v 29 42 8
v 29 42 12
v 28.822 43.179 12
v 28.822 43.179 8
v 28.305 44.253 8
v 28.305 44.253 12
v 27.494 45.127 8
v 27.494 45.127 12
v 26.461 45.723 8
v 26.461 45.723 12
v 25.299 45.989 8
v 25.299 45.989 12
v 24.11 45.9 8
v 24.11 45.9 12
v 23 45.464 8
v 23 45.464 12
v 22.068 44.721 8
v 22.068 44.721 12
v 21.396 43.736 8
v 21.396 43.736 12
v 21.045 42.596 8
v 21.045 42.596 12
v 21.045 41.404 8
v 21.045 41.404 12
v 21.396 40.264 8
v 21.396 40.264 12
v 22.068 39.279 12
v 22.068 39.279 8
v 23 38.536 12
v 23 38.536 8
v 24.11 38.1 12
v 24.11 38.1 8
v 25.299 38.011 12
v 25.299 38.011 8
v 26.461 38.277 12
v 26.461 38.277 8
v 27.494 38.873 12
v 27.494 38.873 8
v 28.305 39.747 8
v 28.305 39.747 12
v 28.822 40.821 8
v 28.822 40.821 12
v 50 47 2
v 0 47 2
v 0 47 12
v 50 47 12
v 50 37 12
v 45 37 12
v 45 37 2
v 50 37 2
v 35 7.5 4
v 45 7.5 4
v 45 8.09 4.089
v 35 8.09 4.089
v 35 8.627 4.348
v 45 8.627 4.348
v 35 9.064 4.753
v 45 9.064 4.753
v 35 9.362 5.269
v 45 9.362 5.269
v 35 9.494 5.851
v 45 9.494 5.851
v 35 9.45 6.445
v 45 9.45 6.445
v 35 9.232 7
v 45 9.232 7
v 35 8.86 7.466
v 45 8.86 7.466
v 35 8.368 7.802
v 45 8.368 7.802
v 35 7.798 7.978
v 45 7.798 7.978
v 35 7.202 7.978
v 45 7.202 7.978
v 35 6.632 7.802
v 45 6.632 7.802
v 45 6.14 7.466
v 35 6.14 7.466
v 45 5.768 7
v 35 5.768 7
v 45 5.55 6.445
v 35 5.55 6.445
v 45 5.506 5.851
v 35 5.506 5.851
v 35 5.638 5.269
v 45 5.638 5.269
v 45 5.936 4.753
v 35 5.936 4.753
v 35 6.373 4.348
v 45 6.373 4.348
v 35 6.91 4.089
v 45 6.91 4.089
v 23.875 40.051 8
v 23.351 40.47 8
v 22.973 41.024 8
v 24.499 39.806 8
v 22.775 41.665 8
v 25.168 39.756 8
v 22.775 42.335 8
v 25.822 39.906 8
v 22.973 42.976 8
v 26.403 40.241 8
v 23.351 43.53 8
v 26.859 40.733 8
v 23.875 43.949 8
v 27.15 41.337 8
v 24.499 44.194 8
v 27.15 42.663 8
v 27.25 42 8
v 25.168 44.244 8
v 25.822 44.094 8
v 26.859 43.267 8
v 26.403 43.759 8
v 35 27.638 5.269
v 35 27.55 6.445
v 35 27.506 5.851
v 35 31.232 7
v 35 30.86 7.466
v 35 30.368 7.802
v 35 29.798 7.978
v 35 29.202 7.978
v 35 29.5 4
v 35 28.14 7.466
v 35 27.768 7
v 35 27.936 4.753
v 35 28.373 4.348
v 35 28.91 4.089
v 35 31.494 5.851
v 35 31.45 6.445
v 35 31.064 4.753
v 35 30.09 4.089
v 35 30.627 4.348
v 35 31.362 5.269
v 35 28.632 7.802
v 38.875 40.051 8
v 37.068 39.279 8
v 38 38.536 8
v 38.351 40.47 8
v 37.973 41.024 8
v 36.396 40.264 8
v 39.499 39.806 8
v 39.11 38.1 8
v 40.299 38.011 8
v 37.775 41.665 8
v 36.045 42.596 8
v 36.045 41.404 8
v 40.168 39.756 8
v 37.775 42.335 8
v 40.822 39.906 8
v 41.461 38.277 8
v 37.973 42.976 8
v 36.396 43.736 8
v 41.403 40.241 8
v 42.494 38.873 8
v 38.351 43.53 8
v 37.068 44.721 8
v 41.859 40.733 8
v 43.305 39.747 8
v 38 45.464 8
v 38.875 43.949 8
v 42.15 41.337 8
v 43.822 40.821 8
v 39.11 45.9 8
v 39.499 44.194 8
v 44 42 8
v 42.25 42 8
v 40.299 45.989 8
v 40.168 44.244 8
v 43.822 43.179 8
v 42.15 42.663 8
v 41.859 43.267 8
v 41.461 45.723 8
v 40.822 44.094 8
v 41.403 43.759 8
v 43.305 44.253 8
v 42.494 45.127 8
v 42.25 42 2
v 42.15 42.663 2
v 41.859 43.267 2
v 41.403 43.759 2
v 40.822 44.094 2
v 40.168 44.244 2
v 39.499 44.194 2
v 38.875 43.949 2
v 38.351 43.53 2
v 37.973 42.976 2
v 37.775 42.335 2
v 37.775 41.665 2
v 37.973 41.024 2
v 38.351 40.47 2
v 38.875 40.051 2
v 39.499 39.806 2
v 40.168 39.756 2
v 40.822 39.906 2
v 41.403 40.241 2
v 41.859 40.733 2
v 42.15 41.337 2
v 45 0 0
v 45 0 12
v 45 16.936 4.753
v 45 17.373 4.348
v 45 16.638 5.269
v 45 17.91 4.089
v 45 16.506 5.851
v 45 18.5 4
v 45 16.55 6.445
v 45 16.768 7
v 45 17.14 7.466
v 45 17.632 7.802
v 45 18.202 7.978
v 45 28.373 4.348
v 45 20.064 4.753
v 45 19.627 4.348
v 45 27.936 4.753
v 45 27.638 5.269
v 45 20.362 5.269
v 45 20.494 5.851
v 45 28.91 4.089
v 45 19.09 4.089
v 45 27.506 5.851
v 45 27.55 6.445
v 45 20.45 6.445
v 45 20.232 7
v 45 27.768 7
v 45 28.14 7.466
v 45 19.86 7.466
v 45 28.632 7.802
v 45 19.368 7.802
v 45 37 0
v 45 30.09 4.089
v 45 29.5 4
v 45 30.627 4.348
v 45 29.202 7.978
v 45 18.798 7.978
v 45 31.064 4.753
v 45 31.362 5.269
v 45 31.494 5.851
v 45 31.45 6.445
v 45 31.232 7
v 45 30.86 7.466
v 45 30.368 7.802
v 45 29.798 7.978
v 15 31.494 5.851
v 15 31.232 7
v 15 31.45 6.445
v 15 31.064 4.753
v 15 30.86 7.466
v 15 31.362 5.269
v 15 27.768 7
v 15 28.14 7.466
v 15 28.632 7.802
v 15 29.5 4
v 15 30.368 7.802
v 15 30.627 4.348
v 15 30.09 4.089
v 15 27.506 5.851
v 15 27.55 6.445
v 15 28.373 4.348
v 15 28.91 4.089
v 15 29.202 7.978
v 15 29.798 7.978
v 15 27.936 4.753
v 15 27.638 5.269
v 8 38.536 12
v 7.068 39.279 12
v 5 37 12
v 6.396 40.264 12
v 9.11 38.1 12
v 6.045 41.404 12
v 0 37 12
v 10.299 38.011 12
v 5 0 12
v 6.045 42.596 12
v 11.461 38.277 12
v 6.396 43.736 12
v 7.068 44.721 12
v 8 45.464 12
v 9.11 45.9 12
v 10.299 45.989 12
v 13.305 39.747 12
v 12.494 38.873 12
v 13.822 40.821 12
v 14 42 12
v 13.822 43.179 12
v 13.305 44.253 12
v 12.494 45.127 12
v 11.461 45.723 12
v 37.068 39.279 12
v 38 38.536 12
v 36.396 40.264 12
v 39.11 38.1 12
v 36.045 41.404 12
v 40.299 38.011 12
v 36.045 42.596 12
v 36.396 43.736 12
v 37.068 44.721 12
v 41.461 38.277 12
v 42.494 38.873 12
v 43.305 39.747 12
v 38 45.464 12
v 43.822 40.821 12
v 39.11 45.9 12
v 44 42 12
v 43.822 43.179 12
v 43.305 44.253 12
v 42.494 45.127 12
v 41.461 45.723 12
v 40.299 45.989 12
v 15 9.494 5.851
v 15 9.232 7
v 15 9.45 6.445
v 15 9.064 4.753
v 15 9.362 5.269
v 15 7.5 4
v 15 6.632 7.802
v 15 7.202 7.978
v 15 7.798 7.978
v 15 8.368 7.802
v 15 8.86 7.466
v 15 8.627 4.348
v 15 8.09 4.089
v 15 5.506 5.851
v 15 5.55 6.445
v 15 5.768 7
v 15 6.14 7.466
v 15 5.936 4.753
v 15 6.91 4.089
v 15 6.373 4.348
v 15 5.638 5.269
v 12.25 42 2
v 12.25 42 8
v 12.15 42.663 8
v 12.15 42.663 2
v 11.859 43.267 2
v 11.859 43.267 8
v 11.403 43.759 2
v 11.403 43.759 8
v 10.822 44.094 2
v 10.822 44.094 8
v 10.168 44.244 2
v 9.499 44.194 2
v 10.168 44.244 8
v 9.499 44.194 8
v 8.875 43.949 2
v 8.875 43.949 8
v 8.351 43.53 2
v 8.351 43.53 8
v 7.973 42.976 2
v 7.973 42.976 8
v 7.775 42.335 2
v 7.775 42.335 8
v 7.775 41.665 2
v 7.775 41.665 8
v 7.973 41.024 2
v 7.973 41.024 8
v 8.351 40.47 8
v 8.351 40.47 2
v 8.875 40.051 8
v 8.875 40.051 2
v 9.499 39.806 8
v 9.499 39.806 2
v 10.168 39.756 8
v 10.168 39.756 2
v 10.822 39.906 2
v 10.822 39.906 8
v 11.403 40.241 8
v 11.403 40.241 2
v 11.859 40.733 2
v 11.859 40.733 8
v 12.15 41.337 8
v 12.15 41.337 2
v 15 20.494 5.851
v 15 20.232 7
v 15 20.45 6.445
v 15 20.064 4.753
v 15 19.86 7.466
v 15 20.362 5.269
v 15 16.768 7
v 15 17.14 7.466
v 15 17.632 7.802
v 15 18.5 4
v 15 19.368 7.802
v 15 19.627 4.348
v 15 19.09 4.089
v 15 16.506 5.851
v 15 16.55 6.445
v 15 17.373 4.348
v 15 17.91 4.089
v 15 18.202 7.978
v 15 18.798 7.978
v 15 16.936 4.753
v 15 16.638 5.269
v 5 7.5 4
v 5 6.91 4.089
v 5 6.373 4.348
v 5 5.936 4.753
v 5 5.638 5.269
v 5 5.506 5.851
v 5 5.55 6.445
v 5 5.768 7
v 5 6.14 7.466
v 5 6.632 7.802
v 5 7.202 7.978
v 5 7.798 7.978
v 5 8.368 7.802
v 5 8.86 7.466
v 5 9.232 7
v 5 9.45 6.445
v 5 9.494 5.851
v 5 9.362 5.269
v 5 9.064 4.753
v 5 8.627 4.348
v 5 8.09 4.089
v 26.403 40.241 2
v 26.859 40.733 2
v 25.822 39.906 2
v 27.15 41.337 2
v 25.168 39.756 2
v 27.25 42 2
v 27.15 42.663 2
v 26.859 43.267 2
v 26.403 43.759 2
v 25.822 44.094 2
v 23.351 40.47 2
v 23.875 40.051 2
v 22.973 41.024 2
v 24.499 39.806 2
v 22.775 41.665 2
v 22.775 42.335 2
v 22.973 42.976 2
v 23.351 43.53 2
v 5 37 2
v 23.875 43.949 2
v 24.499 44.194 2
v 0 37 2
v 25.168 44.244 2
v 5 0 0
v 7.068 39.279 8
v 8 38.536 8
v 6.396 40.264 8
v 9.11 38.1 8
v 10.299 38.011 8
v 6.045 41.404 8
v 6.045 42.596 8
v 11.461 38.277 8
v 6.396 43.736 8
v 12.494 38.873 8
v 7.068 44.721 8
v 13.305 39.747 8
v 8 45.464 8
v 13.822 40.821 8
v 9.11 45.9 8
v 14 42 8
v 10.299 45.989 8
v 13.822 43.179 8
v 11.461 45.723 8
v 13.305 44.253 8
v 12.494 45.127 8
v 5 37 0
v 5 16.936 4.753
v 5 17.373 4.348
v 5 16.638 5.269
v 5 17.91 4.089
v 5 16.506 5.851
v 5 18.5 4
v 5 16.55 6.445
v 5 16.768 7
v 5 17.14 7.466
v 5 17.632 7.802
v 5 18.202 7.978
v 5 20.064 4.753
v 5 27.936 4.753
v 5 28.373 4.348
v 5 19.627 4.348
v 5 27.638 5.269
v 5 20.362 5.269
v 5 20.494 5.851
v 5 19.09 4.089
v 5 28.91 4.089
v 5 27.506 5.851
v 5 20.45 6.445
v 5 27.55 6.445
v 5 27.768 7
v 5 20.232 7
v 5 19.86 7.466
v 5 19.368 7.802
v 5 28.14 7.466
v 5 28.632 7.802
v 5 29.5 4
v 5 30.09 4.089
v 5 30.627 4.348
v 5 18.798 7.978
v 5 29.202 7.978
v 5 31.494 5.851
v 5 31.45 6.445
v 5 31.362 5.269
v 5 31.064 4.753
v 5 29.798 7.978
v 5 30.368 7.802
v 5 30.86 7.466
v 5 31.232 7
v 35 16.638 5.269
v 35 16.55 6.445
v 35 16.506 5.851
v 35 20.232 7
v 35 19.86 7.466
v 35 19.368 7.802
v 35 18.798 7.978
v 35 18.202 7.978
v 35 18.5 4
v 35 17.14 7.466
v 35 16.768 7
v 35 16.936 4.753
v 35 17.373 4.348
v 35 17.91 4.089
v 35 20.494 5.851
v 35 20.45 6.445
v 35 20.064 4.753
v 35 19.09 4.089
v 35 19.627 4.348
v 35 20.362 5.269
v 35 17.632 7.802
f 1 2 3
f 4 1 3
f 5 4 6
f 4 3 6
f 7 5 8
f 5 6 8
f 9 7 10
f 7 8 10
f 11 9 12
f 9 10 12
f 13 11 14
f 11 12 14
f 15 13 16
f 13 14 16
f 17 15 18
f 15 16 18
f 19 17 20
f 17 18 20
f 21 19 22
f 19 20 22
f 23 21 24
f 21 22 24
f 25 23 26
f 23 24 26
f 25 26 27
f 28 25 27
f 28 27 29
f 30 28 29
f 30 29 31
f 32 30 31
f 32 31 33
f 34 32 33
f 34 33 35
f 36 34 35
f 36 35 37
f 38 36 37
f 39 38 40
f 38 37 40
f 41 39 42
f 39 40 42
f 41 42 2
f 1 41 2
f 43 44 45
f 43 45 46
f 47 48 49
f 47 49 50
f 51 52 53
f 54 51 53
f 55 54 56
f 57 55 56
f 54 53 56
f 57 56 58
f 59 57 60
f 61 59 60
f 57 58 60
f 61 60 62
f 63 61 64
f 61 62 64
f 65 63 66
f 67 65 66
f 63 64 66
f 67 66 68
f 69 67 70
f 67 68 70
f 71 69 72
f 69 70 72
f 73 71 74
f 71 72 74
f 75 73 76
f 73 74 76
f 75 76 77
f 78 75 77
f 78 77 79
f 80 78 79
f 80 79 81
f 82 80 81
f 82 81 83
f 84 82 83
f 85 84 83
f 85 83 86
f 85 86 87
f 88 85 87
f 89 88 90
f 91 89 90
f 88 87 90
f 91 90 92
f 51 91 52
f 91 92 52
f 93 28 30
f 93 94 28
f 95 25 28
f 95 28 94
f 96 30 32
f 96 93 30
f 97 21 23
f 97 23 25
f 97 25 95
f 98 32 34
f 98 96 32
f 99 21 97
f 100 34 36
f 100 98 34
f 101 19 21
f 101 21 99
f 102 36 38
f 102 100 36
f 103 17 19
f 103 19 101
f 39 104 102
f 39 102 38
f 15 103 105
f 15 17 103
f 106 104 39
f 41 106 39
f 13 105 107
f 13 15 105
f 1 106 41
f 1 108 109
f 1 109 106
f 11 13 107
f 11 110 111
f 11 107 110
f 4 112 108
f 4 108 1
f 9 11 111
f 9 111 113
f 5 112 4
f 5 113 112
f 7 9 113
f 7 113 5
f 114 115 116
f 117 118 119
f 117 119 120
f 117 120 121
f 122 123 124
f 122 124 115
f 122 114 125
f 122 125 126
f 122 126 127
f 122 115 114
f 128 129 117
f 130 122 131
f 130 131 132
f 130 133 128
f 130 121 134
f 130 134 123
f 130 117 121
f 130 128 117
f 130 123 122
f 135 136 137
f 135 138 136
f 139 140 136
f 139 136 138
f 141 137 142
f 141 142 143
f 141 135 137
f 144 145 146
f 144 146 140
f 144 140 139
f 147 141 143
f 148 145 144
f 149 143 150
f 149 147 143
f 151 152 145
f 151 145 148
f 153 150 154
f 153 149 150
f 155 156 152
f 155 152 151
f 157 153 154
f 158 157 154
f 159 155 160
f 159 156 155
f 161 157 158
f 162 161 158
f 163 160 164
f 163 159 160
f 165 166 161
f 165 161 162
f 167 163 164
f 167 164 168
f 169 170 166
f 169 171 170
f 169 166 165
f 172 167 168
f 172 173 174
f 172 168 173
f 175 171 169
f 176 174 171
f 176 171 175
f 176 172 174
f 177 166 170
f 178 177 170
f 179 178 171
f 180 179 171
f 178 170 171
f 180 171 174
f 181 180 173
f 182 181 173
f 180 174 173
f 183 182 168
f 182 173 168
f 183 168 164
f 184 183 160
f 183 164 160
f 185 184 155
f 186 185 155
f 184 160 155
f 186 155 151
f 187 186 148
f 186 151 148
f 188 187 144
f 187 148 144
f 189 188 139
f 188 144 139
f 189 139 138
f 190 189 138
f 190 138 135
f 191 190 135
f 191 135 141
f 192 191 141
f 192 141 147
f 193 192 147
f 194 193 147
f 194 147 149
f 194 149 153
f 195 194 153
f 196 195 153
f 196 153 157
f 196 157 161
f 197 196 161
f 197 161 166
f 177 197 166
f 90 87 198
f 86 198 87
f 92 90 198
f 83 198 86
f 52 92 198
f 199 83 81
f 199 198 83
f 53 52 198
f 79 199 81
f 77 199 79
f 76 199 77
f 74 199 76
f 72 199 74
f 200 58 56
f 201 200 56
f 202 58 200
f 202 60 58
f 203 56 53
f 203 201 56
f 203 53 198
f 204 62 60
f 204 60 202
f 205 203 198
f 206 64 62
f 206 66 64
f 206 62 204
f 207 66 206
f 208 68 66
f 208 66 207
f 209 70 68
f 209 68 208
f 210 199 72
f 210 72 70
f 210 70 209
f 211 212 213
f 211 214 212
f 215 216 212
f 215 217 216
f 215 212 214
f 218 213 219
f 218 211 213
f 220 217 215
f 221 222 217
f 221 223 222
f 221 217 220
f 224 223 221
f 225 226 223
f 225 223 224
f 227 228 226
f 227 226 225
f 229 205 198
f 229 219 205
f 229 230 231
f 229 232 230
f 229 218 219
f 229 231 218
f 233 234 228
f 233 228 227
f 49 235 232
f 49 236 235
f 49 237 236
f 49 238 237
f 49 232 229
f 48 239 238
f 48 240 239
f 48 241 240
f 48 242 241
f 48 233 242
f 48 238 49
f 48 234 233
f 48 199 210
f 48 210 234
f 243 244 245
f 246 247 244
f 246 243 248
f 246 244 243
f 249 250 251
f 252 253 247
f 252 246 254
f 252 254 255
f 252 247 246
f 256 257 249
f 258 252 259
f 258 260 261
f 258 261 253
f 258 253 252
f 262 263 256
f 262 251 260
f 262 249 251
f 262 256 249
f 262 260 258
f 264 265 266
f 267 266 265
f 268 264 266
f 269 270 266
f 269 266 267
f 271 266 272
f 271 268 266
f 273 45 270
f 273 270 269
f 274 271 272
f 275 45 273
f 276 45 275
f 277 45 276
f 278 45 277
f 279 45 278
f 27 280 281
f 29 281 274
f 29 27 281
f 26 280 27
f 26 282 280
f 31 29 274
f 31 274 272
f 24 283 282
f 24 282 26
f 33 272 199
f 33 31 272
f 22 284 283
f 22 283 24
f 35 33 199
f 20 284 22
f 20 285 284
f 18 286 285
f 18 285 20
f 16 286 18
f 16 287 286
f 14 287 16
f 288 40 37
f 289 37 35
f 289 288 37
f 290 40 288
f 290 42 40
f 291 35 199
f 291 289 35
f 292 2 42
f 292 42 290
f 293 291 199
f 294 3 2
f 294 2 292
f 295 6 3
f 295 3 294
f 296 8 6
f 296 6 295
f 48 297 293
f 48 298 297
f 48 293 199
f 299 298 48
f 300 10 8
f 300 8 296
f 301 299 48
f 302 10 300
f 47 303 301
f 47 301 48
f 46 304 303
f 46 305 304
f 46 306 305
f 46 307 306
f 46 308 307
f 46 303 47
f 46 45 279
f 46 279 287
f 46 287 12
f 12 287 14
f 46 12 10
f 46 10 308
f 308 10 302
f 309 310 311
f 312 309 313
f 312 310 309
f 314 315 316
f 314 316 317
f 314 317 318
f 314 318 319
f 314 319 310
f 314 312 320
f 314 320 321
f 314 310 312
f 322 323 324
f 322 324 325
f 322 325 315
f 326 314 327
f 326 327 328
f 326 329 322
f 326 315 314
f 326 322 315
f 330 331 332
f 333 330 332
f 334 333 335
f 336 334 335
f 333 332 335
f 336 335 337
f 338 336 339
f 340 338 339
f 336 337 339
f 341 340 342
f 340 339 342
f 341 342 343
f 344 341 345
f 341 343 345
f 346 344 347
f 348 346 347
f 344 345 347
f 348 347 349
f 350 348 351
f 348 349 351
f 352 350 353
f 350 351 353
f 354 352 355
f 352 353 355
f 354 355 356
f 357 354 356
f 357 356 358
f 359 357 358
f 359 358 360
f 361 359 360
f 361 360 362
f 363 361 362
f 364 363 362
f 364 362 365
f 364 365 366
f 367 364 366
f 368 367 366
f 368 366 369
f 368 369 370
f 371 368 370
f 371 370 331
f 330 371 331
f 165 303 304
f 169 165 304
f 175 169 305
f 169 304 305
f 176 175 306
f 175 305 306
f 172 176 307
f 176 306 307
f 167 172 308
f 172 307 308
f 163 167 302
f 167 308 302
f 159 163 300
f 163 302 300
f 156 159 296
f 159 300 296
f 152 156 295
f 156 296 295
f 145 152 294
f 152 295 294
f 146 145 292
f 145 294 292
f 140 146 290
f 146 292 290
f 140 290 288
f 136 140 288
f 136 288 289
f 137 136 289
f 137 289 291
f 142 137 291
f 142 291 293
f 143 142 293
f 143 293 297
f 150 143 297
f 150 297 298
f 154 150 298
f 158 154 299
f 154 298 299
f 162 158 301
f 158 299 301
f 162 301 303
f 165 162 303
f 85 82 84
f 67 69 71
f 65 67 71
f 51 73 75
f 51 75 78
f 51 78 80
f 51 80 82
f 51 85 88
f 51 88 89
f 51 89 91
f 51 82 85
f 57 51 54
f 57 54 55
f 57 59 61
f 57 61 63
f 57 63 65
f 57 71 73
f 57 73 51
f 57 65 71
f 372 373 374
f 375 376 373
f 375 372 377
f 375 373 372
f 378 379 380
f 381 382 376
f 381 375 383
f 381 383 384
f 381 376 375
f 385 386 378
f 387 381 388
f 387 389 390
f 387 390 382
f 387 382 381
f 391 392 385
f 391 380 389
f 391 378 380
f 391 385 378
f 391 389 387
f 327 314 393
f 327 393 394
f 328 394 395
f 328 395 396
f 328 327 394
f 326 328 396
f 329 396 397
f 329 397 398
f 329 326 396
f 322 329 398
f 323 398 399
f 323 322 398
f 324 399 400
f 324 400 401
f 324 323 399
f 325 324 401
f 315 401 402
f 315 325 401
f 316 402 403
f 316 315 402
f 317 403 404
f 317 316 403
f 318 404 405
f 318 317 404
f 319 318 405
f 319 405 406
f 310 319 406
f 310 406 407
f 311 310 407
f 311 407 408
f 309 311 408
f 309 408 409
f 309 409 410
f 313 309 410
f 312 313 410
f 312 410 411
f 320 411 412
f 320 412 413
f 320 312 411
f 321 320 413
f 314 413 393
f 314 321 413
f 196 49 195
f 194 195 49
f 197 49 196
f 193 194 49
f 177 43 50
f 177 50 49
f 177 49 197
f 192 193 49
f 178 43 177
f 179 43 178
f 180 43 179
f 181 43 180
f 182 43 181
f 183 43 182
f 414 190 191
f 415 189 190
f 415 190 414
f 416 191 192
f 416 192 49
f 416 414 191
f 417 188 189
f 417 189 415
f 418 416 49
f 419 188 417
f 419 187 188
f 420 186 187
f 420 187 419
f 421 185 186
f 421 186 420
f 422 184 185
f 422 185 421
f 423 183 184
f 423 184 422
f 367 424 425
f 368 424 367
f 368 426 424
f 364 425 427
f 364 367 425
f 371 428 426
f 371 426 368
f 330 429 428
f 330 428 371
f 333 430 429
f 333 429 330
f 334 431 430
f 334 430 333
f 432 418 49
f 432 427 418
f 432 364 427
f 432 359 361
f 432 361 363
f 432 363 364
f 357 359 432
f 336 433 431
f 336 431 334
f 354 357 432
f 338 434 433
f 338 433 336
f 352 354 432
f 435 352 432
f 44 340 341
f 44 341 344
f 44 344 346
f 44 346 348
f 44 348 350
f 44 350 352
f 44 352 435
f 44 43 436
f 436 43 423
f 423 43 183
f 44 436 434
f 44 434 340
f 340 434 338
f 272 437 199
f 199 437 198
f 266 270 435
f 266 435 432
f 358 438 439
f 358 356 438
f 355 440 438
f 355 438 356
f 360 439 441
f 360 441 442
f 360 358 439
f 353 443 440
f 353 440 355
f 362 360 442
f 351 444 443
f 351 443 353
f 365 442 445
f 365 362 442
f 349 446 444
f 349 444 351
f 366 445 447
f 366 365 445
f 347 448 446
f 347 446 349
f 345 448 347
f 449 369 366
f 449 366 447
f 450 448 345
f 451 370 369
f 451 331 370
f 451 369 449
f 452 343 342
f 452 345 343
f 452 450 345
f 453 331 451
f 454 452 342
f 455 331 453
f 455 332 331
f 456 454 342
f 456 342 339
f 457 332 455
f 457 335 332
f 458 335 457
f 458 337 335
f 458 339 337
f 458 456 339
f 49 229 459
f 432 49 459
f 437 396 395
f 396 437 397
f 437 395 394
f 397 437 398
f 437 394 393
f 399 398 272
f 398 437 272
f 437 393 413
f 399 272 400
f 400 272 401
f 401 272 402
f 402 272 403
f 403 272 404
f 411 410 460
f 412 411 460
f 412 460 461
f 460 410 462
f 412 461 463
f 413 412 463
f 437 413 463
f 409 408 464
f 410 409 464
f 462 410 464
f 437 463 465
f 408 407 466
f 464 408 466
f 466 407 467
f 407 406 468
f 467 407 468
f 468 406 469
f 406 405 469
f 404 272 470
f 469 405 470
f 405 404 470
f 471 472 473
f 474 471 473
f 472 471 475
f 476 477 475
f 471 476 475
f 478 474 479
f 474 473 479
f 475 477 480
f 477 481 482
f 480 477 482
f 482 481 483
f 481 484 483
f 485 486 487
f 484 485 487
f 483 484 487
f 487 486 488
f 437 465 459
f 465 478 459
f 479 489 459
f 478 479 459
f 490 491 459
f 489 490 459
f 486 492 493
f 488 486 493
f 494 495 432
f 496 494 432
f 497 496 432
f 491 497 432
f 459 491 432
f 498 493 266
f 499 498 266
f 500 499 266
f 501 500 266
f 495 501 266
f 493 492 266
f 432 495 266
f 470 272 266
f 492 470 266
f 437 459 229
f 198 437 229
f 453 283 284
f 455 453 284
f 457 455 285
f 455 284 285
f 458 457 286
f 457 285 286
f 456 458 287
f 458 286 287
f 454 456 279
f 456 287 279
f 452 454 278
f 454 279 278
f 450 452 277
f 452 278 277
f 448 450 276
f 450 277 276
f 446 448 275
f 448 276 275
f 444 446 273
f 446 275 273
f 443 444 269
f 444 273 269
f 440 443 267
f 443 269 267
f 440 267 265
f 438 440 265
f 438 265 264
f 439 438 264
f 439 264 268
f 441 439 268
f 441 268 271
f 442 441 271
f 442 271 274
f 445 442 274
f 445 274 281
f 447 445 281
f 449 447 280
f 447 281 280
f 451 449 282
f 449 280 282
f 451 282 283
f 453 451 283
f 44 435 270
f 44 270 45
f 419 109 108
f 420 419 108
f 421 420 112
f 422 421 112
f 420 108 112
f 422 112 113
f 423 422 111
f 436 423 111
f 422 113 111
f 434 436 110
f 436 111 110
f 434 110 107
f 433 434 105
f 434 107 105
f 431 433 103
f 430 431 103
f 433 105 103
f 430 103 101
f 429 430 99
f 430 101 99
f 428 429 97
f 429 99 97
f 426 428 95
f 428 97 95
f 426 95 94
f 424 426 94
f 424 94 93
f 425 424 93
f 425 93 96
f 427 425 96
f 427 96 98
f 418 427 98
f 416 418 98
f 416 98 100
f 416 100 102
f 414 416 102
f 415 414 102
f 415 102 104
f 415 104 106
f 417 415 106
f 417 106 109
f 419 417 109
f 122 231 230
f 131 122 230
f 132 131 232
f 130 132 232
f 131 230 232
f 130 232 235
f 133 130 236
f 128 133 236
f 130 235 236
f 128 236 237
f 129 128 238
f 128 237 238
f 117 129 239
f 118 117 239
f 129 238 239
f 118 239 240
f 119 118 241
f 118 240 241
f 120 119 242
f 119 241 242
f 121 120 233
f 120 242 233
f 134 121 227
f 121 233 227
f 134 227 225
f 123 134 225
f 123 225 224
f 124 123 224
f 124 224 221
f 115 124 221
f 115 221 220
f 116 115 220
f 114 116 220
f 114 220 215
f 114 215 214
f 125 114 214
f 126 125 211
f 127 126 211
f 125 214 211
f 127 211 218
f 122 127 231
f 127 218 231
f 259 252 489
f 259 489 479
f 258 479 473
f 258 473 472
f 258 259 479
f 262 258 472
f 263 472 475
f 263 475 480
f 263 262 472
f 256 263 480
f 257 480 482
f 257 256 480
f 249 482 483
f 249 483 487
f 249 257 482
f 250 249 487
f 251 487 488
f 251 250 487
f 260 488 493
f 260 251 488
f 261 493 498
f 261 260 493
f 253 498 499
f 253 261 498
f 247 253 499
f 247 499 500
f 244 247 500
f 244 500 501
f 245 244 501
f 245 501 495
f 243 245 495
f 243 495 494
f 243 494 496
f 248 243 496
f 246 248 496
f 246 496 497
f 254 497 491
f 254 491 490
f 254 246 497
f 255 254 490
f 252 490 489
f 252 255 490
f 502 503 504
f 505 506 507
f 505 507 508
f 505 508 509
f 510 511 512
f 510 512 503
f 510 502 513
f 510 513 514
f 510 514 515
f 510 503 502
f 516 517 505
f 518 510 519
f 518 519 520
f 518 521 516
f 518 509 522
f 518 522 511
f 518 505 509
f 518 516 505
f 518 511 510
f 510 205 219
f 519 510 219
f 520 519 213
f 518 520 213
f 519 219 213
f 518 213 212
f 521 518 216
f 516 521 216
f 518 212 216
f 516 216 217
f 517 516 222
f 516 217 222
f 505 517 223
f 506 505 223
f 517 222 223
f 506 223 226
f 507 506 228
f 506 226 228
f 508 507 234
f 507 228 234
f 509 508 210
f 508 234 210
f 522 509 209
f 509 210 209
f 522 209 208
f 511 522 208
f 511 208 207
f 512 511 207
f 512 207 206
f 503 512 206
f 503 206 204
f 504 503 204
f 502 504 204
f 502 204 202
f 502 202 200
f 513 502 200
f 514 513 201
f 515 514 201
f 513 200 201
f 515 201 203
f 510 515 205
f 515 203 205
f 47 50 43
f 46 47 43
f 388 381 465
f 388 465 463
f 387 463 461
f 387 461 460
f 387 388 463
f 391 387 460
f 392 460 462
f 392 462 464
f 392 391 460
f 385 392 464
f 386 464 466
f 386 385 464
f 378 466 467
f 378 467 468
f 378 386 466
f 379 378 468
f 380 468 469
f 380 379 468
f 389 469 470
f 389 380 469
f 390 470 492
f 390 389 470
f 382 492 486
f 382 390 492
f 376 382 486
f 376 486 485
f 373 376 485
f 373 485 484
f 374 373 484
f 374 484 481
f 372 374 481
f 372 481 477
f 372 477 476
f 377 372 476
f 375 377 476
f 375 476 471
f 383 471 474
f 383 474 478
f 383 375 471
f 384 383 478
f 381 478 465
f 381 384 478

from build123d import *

# Parameters (mm, degrees)
SKETCH_1_W          = 50
SKETCH_1_H          = 47
EXTRUDE_1_DEPTH     = 12
SKETCH_2_W          = 50
SKETCH_2_H          = 10
CUT_EXTRUDE_1_DEPTH = 2
SKETCH_3_R          = 2.25
CUT_EXTRUDE_2_DEPTH = 70.663476801
SKETCH_4_W          = 5
SKETCH_4_H          = 37
CUT_EXTRUDE_3_DEPTH = 70.663476801
SKETCH_5_R          = 2
CUT_EXTRUDE_4_DEPTH = 10
CUT_EXTRUDE_START   = -10
SKETCH_6_R          = 2
CUT_EXTRUDE_5_DEPTH = 10
SKETCH_7_R          = 4
CUT_EXTRUDE_6_DEPTH = 4


with BuildPart() as part:
    # 스케치1 → 보스-돌출1 (new body)
    with BuildSketch(Plane.XY):
        with Locations((25, 23.5)):
            Rectangle(SKETCH_1_W, SKETCH_1_H)
    extrude(amount=EXTRUDE_1_DEPTH)

    # 스케치2 → 컷-돌출1 (cut)
    with BuildSketch(Plane(origin=(0, 0, 0), x_dir=(-1, 0, 0), z_dir=(0, 0, -1))):
        with Locations((-25, 42)):
            Rectangle(SKETCH_2_W, SKETCH_2_H)
    extrude(amount=-CUT_EXTRUDE_1_DEPTH, mode=Mode.SUBTRACT)

    # 스케치3 → 컷-돌출2 (cut, through all)
    with BuildSketch(Plane.XY.offset(12)):
        with Locations((25, 42)):
            Circle(SKETCH_3_R)
        with Locations((40, 42)):
            Circle(SKETCH_3_R)
        with Locations((10, 42)):
            Circle(SKETCH_3_R)
    extrude(amount=-CUT_EXTRUDE_2_DEPTH, mode=Mode.SUBTRACT)

    # 스케치4 → 컷-돌출3 (cut, through all)
    with BuildSketch(Plane.XY.offset(12)):
        with Locations((2.5, 18.5)):
            Rectangle(SKETCH_4_W, SKETCH_4_H)
        with Locations((47.5, 18.5)):
            Rectangle(SKETCH_4_W, SKETCH_4_H)
    extrude(amount=-CUT_EXTRUDE_3_DEPTH, mode=Mode.SUBTRACT)

    # 스케치5 → 컷-돌출4 (cut)
    with BuildSketch(Plane(origin=(45, 0, 0), x_dir=(0, 0, -1), z_dir=(1, 0, 0))):
        with Locations((-6, 29.5)):
            Circle(SKETCH_5_R)
        with Locations((-6, 18.5)):
            Circle(SKETCH_5_R)
        with Locations((-6, 7.5)):
            Circle(SKETCH_5_R)
    extrude(amount=-CUT_EXTRUDE_4_DEPTH, mode=Mode.SUBTRACT)

    # 스케치6 → 컷-돌출5 (cut)
    with BuildSketch(Plane.ZY.offset(-5).offset(CUT_EXTRUDE_START)):
        with Locations(Location((6, 29.5, 0), (0, 0, 180))):
            Circle(SKETCH_6_R)
        with Locations(Location((6, 18.5, 0), (0, 0, 180))):
            Circle(SKETCH_6_R)
        with Locations(Location((6, 7.5, 0), (0, 0, 180))):
            Circle(SKETCH_6_R)
    extrude(amount=CUT_EXTRUDE_5_DEPTH, mode=Mode.SUBTRACT)

    # 스케치7 → 컷-돌출6 (cut)
    with BuildSketch(Plane.XY.offset(12)):
        with Locations((10, 42)):
            Circle(SKETCH_7_R)
        with Locations((25, 42)):
            Circle(SKETCH_7_R)
        with Locations((40, 42)):
            Circle(SKETCH_7_R)
    extrude(amount=-CUT_EXTRUDE_6_DEPTH, mode=Mode.SUBTRACT)


solid = part.part
